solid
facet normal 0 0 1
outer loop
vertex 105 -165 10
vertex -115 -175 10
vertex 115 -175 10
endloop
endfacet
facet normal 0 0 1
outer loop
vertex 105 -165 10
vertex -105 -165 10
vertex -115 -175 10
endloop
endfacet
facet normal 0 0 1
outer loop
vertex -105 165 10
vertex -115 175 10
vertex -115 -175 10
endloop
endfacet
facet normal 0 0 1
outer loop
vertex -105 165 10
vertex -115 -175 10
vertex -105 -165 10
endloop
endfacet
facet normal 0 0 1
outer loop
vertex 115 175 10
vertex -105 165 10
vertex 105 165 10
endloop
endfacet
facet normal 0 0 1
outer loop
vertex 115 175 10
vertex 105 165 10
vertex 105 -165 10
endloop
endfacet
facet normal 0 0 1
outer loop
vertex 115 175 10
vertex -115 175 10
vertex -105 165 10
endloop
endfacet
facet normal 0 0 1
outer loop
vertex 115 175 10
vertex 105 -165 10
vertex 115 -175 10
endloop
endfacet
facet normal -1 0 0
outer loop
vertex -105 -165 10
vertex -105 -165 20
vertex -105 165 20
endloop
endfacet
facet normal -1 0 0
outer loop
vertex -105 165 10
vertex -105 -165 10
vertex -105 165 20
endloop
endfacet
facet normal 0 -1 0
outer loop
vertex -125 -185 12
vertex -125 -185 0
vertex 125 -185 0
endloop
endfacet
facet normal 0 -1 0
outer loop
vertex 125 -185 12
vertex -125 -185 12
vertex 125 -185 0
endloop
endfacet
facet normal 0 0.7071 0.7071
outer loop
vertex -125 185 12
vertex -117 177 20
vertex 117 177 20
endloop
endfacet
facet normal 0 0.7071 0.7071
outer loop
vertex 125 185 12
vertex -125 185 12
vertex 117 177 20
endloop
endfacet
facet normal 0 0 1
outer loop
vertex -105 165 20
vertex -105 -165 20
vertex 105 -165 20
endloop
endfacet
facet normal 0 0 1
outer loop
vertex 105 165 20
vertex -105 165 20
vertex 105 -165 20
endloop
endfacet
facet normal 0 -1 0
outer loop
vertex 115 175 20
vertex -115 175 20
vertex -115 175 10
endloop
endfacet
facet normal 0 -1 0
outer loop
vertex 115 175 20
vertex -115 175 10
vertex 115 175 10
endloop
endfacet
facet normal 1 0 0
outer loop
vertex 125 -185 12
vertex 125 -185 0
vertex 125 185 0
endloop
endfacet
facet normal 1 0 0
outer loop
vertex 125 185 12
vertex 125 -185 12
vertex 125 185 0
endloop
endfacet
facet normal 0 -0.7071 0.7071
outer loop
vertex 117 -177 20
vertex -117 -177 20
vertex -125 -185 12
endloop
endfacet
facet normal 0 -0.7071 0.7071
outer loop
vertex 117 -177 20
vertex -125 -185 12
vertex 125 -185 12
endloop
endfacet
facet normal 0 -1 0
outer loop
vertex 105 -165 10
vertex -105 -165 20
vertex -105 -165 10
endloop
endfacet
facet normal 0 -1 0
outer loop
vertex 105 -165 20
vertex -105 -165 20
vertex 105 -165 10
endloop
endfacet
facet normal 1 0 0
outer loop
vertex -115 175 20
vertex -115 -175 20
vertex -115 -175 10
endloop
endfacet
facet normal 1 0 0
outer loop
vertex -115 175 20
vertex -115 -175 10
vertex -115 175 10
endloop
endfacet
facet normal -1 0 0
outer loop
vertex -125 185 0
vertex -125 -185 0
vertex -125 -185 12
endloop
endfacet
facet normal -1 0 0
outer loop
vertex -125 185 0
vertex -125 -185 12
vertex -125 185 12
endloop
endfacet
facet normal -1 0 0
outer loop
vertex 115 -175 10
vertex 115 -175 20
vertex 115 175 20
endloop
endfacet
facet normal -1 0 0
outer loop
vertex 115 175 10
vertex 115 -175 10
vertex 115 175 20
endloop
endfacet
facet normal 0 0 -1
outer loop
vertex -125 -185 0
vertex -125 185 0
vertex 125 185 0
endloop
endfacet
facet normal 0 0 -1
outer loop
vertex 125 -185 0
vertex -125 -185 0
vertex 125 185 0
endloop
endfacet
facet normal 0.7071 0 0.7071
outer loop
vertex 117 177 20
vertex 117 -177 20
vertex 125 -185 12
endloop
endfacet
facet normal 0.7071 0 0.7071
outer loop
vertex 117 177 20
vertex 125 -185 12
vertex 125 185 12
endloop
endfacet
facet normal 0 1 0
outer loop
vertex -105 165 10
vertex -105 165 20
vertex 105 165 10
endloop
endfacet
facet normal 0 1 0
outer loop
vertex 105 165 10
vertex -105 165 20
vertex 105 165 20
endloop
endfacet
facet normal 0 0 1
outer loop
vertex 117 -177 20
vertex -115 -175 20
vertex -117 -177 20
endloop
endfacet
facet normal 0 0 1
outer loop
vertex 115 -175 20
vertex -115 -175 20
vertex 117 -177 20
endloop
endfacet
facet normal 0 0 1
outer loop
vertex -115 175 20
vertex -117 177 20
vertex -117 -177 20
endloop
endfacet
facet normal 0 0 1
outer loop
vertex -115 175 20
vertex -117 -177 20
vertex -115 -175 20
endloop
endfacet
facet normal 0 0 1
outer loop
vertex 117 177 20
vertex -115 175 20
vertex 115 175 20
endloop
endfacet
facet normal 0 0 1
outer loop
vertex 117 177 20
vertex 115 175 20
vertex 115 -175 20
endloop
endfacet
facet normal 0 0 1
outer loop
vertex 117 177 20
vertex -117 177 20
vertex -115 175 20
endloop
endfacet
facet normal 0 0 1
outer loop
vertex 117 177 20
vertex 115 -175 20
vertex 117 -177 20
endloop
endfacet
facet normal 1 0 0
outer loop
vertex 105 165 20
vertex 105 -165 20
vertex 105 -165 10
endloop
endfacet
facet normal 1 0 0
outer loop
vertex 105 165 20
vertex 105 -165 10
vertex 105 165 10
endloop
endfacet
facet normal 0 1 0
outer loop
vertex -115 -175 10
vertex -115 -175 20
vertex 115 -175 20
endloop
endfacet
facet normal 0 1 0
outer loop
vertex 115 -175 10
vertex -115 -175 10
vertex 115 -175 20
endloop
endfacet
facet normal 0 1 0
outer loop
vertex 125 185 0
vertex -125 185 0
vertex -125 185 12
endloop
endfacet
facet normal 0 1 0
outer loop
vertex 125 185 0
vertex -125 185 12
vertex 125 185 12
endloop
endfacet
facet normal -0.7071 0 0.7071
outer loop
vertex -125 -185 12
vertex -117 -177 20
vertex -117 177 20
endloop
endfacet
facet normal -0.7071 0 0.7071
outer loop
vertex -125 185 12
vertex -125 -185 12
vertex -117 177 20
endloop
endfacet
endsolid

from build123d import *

# Parameters (mm, degrees)
SKETCH_1_W          = 250
SKETCH_1_H          = 370
EXTRUDE_1_DEPTH     = 20
CHAMFER_1_SIZE      = 8
SKETCH_2_W          = 230
SKETCH_2_H          = 350
SKETCH_2_W_2        = 210
SKETCH_2_H_2        = 330
CUT_EXTRUDE_1_DEPTH = 10


with BuildPart() as part:
    # Эскиз1 → Бобышка-Вытянуть1 (new body)
    with BuildSketch(Plane.XY):
        Rectangle(SKETCH_1_W, SKETCH_1_H)
    extrude(amount=EXTRUDE_1_DEPTH)

    # Фаска1
    chamfer_1_edges = [part.edges().sort_by_distance(p)[0] for p in [
        (0, -185, 20),
        (-125, 0, 20),
        (0, 185, 20),
        (125, 0, 20),
    ]]
    chamfer(chamfer_1_edges, length=CHAMFER_1_SIZE)

    # Эскиз2 → Вырез-Вытянуть1 (cut)
    with BuildSketch(Plane.XY.offset(20)):
        Rectangle(SKETCH_2_W, SKETCH_2_H)
        Rectangle(SKETCH_2_W_2, SKETCH_2_H_2, mode=Mode.SUBTRACT)
    extrude(amount=-CUT_EXTRUDE_1_DEPTH, mode=Mode.SUBTRACT)


solid = part.part
